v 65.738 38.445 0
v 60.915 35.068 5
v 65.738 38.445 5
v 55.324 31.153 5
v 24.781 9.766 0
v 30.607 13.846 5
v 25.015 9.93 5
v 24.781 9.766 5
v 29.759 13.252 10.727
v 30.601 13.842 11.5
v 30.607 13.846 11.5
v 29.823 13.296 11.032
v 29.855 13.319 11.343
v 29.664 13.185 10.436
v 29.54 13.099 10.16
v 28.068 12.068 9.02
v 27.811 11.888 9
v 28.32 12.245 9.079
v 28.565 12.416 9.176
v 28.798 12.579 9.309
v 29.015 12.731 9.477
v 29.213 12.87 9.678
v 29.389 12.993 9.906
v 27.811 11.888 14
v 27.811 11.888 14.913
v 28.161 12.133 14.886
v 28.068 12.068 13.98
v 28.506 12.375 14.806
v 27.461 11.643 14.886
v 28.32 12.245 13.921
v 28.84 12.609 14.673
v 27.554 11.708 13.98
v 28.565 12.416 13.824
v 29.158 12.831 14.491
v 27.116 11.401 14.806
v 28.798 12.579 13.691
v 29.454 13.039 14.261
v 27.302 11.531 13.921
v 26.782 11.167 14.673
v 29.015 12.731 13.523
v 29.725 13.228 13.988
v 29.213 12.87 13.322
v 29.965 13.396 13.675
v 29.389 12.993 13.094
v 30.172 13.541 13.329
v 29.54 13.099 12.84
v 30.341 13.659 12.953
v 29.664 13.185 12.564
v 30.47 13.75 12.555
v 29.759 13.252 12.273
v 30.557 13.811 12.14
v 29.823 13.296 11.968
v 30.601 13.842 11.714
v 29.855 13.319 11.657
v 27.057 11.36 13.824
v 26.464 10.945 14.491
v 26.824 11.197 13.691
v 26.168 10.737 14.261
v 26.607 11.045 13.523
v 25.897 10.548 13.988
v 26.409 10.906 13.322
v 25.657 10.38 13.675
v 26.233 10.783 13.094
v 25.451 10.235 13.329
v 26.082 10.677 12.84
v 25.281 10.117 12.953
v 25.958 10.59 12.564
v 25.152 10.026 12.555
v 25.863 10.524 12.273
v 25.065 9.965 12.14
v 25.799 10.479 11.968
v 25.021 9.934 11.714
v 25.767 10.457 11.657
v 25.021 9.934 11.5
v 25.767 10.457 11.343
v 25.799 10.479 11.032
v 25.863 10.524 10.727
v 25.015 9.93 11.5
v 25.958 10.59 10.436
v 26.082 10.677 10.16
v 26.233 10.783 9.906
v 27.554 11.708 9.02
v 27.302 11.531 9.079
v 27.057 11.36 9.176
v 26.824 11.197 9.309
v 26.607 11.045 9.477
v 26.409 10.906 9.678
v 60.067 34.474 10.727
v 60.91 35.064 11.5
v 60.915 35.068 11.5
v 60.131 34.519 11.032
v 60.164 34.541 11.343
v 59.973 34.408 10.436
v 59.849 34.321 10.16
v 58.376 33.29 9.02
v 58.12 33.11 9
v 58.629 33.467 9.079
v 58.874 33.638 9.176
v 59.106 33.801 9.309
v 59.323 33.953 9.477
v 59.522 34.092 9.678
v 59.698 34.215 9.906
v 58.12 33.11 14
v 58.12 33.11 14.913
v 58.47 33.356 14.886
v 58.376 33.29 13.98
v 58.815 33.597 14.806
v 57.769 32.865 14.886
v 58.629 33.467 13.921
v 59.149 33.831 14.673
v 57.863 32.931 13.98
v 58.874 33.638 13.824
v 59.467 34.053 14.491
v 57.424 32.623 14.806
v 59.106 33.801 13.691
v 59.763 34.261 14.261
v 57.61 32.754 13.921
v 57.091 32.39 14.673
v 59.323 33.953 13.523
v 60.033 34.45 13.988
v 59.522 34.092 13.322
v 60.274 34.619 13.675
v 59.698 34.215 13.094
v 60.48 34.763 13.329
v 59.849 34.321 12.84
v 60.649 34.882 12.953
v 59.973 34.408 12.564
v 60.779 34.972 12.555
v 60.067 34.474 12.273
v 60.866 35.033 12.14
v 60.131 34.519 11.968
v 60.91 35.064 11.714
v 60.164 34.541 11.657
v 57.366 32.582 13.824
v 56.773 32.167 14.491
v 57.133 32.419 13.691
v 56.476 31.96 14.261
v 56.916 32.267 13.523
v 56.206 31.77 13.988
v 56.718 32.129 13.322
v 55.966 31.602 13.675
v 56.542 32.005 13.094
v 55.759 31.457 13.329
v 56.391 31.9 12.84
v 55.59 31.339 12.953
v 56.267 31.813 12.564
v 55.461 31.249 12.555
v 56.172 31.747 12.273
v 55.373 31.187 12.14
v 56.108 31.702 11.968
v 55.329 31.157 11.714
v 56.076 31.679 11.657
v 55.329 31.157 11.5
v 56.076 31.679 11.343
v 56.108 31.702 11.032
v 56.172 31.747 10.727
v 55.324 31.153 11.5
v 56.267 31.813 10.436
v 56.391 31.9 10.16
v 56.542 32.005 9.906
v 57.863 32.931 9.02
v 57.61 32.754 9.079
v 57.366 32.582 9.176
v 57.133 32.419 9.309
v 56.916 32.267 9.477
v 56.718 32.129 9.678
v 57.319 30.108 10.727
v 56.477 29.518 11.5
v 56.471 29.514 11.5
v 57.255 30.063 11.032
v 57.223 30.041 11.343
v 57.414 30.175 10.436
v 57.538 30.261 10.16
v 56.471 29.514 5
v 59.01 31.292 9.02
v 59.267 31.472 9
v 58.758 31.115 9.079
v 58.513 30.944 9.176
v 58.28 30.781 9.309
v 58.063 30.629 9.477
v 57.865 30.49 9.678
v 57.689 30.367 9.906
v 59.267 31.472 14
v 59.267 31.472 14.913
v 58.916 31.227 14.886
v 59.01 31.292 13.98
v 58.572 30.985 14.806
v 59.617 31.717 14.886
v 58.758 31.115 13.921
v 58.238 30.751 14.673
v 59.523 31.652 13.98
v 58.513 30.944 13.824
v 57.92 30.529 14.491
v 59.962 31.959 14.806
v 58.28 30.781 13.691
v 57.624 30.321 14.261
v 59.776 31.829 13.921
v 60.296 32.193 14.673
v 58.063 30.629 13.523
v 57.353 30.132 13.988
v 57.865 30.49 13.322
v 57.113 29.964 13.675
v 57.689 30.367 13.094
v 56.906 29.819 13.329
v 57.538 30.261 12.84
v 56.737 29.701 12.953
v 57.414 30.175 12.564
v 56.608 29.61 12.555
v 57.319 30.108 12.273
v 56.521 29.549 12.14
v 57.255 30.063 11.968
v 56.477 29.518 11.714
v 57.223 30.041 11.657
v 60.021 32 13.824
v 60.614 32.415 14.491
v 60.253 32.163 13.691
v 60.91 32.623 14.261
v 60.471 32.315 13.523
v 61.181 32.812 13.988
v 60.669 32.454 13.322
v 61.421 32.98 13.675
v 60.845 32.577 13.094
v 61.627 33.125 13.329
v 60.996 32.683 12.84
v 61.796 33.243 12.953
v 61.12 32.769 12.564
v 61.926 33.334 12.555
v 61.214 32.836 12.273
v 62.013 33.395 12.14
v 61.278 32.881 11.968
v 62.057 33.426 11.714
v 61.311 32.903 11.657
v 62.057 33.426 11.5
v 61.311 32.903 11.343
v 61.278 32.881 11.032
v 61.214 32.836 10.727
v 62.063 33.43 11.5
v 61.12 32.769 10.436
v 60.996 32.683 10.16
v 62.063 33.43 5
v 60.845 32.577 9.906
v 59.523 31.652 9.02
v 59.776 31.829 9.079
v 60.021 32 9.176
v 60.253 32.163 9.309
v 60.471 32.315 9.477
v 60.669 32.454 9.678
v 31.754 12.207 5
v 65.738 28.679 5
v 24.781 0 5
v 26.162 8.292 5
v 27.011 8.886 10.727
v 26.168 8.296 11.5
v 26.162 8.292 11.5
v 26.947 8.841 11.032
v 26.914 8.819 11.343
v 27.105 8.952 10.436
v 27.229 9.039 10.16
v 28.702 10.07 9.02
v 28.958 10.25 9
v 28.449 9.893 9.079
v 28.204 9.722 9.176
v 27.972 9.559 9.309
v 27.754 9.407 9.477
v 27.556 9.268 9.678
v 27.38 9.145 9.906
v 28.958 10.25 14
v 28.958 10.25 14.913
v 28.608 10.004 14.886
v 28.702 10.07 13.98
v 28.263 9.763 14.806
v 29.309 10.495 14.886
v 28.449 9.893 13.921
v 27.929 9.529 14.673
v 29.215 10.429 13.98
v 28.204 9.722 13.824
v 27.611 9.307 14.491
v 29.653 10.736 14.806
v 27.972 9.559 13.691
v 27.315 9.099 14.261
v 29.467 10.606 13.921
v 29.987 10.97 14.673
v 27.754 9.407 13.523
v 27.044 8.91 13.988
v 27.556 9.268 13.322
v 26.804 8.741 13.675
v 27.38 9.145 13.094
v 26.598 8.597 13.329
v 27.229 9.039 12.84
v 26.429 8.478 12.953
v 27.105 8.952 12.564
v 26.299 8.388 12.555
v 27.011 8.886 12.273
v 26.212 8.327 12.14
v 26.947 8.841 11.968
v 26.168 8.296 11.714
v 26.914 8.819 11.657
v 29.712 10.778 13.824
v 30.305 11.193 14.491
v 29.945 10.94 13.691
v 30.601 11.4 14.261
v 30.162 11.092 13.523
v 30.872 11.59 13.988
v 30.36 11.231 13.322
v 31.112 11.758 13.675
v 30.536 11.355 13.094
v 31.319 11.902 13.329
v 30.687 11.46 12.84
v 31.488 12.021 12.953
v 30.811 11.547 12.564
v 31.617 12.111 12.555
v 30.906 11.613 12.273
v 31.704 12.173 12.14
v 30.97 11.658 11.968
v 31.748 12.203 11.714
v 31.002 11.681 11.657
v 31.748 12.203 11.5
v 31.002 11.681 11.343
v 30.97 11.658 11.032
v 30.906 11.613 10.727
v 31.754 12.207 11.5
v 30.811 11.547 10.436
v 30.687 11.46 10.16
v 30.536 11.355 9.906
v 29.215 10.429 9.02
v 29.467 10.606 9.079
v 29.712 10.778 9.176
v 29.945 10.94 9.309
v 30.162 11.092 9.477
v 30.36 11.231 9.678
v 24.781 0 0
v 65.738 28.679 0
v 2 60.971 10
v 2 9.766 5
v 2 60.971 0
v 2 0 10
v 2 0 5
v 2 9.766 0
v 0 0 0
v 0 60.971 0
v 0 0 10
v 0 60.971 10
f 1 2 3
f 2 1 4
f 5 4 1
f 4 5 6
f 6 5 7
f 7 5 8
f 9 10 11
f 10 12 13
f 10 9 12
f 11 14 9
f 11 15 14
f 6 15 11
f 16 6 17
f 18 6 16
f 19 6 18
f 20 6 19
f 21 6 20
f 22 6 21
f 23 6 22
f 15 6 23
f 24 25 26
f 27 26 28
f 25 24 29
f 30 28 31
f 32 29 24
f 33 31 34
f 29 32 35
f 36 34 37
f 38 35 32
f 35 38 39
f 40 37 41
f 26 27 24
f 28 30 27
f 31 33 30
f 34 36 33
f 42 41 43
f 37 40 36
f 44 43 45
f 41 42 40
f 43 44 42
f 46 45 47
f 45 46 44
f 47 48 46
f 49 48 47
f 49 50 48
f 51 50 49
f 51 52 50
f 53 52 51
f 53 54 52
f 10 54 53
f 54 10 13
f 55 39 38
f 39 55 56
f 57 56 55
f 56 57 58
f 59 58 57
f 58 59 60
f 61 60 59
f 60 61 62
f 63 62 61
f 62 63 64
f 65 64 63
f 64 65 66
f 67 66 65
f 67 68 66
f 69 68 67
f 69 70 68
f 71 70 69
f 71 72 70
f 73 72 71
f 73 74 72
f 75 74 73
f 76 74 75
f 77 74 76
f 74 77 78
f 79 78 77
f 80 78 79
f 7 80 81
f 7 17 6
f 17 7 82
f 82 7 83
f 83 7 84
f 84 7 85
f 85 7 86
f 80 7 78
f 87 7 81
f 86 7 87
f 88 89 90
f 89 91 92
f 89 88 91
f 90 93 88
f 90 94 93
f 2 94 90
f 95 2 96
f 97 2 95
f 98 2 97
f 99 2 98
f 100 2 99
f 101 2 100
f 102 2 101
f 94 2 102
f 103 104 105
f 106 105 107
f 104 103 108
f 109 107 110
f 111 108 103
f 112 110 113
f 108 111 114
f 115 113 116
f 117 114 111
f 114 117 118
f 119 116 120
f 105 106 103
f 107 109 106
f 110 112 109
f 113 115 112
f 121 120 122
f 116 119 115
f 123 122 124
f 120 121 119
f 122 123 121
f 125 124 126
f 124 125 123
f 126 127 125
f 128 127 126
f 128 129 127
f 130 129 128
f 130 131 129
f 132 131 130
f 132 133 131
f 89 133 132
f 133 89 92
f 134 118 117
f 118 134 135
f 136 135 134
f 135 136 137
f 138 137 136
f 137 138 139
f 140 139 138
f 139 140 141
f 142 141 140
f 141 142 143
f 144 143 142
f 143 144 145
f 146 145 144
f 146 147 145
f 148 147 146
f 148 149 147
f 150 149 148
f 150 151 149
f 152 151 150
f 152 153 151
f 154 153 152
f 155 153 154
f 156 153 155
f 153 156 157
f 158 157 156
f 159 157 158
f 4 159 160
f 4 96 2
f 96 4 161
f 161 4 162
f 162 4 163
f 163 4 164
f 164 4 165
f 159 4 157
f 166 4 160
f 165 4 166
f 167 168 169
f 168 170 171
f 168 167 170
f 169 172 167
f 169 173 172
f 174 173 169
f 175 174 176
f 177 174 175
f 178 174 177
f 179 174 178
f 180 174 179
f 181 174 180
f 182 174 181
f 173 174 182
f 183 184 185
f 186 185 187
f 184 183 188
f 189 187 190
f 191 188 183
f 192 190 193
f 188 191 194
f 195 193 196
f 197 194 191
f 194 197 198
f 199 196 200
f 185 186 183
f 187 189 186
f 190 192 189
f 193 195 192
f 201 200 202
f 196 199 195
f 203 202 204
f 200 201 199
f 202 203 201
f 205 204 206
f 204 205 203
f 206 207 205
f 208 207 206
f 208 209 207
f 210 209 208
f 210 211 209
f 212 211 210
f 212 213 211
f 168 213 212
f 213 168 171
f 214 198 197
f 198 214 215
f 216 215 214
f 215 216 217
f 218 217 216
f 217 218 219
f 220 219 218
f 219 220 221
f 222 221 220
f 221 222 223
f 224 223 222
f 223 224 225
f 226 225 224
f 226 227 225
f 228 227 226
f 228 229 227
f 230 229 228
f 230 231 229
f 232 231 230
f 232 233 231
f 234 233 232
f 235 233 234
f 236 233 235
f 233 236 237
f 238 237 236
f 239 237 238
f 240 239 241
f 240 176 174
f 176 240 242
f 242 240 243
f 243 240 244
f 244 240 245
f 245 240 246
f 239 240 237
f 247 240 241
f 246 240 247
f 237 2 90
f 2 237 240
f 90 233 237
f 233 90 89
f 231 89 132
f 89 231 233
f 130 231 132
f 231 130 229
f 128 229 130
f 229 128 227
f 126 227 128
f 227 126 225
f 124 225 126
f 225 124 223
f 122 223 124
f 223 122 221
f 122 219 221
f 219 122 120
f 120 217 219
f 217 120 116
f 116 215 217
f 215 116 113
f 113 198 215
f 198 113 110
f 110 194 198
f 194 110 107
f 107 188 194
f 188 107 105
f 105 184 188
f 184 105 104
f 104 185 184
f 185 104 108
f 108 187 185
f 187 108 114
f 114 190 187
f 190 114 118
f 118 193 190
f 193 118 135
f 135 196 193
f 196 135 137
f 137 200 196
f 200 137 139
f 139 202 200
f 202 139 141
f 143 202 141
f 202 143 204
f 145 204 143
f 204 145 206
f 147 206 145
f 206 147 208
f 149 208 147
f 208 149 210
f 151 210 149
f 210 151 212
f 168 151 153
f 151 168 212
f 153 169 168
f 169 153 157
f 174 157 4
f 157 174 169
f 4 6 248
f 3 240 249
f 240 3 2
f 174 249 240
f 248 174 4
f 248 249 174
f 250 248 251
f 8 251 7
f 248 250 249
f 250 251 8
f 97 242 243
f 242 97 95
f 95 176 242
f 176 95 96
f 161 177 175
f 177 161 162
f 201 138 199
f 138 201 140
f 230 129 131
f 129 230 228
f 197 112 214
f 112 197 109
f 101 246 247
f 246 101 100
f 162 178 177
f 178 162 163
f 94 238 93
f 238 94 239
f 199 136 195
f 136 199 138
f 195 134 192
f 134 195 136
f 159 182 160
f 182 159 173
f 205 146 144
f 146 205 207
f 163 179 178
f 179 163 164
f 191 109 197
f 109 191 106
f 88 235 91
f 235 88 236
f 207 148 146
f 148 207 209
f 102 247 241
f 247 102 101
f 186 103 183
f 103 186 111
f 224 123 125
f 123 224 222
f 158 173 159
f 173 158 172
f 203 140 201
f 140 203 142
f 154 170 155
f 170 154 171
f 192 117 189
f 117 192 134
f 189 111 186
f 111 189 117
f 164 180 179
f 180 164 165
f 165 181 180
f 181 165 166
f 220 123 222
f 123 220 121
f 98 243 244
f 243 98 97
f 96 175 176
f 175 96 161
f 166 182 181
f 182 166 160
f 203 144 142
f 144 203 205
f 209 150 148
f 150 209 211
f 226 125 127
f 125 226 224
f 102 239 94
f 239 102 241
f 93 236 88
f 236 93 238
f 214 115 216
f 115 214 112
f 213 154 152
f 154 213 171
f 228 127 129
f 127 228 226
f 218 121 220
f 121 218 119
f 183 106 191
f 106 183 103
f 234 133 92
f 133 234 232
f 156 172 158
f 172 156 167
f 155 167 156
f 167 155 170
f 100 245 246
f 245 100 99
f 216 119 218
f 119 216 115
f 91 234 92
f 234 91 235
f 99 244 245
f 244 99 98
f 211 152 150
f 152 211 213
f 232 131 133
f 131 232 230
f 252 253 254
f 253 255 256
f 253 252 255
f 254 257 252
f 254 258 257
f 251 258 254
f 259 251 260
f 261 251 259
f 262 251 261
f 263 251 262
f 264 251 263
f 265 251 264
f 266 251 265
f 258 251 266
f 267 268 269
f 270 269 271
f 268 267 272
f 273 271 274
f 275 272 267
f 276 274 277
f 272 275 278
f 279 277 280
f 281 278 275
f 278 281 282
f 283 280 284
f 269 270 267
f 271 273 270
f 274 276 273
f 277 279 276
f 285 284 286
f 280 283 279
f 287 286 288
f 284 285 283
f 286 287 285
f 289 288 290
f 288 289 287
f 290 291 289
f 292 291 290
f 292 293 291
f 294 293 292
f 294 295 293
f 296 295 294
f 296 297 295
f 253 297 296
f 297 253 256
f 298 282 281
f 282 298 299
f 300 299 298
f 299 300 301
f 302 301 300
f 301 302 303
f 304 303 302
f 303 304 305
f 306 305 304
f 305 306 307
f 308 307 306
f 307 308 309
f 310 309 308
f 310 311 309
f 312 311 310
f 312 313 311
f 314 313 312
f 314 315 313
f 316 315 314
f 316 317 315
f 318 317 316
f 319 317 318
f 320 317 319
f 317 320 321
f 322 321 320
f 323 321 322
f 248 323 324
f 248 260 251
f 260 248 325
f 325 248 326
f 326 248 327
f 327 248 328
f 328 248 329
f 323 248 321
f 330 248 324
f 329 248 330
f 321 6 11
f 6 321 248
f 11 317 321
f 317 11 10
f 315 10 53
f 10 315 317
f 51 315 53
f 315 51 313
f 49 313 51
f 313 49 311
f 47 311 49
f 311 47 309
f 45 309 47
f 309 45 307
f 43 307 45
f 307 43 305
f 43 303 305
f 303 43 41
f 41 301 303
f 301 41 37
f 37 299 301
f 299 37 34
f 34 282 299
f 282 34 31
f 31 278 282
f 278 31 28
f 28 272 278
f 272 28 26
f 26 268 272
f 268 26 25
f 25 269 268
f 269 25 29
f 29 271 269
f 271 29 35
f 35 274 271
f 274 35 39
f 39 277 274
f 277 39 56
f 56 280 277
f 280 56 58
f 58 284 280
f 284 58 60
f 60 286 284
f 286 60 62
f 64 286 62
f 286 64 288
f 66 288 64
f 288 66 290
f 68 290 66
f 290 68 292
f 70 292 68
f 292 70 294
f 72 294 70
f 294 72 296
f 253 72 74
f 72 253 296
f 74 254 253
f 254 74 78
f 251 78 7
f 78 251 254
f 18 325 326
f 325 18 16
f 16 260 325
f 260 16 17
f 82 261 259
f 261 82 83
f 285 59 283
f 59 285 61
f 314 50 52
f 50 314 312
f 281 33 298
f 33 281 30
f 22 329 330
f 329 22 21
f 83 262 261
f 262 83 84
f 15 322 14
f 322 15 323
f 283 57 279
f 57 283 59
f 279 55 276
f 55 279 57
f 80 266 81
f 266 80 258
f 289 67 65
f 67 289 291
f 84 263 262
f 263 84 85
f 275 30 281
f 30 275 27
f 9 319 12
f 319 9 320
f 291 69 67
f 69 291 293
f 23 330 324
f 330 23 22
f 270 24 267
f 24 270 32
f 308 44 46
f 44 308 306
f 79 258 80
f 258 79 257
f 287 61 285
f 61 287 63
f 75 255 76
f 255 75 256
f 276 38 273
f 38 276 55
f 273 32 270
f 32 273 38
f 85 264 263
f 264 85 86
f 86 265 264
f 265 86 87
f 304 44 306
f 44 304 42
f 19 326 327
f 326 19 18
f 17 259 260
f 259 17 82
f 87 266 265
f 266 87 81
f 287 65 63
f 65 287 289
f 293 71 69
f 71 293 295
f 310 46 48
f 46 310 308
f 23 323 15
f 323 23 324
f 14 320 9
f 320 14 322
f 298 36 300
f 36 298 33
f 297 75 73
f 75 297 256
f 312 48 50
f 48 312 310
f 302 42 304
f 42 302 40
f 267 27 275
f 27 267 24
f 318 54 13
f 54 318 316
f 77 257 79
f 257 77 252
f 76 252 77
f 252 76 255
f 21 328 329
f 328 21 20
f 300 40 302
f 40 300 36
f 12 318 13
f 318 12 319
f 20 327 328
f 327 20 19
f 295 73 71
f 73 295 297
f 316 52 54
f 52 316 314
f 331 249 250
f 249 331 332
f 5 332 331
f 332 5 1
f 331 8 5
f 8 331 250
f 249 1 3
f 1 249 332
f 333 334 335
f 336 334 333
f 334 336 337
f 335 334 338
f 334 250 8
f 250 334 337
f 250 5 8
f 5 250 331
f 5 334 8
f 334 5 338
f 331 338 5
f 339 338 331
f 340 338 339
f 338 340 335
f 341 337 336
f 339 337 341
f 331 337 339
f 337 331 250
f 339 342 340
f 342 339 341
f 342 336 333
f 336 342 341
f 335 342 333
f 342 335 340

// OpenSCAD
GAUGE_X        = 50;
GAUGE_Y        = 50;
GAUGE_LEN      = 31;
GAUGE_DIAMETER = 45.5;
GAUGE_RADIUS   = GAUGE_DIAMETER / 2;
SCREW_DIAMETER = 5;
SCREW_RADIUS   = SCREW_DIAMETER / 2;
SCREW_OFFSET_X = (32 / 2) + SCREW_RADIUS;
SCREW_OFFSET_Y = (32 / 2) + SCREW_RADIUS;

FRONT_PLATE_DEPTH = 2;
TAB_DEPTH = 2;
GAUGE_TAB_DEPTH = 4;

GAUGE_MOUNT_ANGLE = 35;

module Gauge() {
  difference() {
    linear_extrude(FRONT_PLATE_DEPTH)
      square(size = [GAUGE_X, GAUGE_Y], center=true);

    $fn = 50;
    for(j = [-1, 1]) {
      for(i = [-1, 1]) {
        translate([i * SCREW_OFFSET_X, j * SCREW_OFFSET_Y, -1])
          linear_extrude(4)
          circle(r = SCREW_RADIUS);
      }
    }

    translate([0, 0, -1])
      linear_extrude(4)
      circle(d = GAUGE_DIAMETER);
  }
}

module FrontPlate() {
  translate([-100, 0, 0])
    for(i = [1, 2, 3, 4]) {
      translate([(i * GAUGE_X) - (GAUGE_X / 2), 0, 0])
        Gauge();
    }
}

module Tab() {
  $fn = 50;

  // Radius length to center of screw
  c = sqrt(pow(SCREW_OFFSET_X, 2) + pow(SCREW_OFFSET_Y, 2));

  tab_radius = c - GAUGE_RADIUS;

  difference() {
    linear_extrude(TAB_DEPTH)
      union() {
        circle(r = tab_radius);
        translate([0, -tab_radius])
          square(size = [(GAUGE_X / 2) - SCREW_OFFSET_X, tab_radius * 2]);
      }

    translate([0, 0, -1])
      linear_extrude(5)
      circle(r = SCREW_RADIUS);
  }
}

module prism(l, w, h){
  polyhedron(
      points=[[0,0,0], [l,0,0], [l,w,0], [0,w,0], [0,w,h], [l,w,h]],
      faces=[[0,1,2,3],[5,4,3,2],[0,4,5,1],[0,3,4],[5,2,1]]
      );
}

module GaugeSideMount(bar_x, bar_y, bar_z) {
  radius          = bar_z * tan(GAUGE_MOUNT_ANGLE);
  gauge_x         = GAUGE_X / 2;

  translate([-(gauge_x + (bar_x / 2)), 0, 0]) {
    translate([gauge_x + (bar_x / 2), 0, 0])
      linear_extrude(bar_z)
      square(size = [bar_x, bar_y], center = true);

    translate([gauge_x + bar_x, -((bar_y / 2) + radius), bar_z])
      rotate([0, 180, 0])
      prism(bar_x, radius, bar_z);

    translate([bar_x + gauge_x, (bar_y / 2) + radius, 0])
      rotate([0, 0, 180])
      prism(bar_x, radius, bar_z);

    translate([SCREW_OFFSET_X, SCREW_OFFSET_Y, 0])
      Tab();
    translate([SCREW_OFFSET_X, -SCREW_OFFSET_Y, 0])
      Tab();
  }
}
module SideBar() {
  gauge_side_x = 5;
  gauge_side_z = FRONT_PLATE_DEPTH + GAUGE_TAB_DEPTH + TAB_DEPTH;
  gauge_side_y = (GAUGE_Y - (gauge_side_z * tan(GAUGE_MOUNT_ANGLE)));
  radius       = gauge_side_z / sin(90 - GAUGE_MOUNT_ANGLE);

  front_leg_z = (GAUGE_LEN * sin(GAUGE_MOUNT_ANGLE)) + 5;

  rotate([0, 90, 0]) {
    translate([0, 0, 2]) {
      translate([0,
          (radius / 2) + ((gauge_side_y / 2) * cos(90 - GAUGE_MOUNT_ANGLE)),
          ((gauge_side_y / 2) * sin(90 - GAUGE_MOUNT_ANGLE)) + front_leg_z,
      ])
        rotate([90 - GAUGE_MOUNT_ANGLE, 0, 0])
        GaugeSideMount(gauge_side_x, gauge_side_y, gauge_side_z);

      color("blue")
        linear_extrude(front_leg_z)
        square(size = [gauge_side_x, radius], center = true);
    }

    // Foot
    l = (GAUGE_LEN * cos(GAUGE_MOUNT_ANGLE)) +
      radius +
      (45 * cos(180 - 90 - GAUGE_MOUNT_ANGLE));

    translate([-(gauge_side_x / 2) - 5, -(radius / 2), 0])
      linear_extrude(2)
      square(size = [gauge_side_x + 5, l]);
  }
}

module RightSide() {
  gauge_side_z = FRONT_PLATE_DEPTH + GAUGE_TAB_DEPTH + TAB_DEPTH;
  radius       = gauge_side_z / sin(90 - GAUGE_MOUNT_ANGLE);

  translate([0, radius / 2, 5 / 2])
    SideBar();
}

module LeftSide() {
  mirror([1, 0, 0])
  rotate([0, 90, 0])
    SideBar();
}

//Gauge();
RightSide();
//LeftSide();
//SideBar();
